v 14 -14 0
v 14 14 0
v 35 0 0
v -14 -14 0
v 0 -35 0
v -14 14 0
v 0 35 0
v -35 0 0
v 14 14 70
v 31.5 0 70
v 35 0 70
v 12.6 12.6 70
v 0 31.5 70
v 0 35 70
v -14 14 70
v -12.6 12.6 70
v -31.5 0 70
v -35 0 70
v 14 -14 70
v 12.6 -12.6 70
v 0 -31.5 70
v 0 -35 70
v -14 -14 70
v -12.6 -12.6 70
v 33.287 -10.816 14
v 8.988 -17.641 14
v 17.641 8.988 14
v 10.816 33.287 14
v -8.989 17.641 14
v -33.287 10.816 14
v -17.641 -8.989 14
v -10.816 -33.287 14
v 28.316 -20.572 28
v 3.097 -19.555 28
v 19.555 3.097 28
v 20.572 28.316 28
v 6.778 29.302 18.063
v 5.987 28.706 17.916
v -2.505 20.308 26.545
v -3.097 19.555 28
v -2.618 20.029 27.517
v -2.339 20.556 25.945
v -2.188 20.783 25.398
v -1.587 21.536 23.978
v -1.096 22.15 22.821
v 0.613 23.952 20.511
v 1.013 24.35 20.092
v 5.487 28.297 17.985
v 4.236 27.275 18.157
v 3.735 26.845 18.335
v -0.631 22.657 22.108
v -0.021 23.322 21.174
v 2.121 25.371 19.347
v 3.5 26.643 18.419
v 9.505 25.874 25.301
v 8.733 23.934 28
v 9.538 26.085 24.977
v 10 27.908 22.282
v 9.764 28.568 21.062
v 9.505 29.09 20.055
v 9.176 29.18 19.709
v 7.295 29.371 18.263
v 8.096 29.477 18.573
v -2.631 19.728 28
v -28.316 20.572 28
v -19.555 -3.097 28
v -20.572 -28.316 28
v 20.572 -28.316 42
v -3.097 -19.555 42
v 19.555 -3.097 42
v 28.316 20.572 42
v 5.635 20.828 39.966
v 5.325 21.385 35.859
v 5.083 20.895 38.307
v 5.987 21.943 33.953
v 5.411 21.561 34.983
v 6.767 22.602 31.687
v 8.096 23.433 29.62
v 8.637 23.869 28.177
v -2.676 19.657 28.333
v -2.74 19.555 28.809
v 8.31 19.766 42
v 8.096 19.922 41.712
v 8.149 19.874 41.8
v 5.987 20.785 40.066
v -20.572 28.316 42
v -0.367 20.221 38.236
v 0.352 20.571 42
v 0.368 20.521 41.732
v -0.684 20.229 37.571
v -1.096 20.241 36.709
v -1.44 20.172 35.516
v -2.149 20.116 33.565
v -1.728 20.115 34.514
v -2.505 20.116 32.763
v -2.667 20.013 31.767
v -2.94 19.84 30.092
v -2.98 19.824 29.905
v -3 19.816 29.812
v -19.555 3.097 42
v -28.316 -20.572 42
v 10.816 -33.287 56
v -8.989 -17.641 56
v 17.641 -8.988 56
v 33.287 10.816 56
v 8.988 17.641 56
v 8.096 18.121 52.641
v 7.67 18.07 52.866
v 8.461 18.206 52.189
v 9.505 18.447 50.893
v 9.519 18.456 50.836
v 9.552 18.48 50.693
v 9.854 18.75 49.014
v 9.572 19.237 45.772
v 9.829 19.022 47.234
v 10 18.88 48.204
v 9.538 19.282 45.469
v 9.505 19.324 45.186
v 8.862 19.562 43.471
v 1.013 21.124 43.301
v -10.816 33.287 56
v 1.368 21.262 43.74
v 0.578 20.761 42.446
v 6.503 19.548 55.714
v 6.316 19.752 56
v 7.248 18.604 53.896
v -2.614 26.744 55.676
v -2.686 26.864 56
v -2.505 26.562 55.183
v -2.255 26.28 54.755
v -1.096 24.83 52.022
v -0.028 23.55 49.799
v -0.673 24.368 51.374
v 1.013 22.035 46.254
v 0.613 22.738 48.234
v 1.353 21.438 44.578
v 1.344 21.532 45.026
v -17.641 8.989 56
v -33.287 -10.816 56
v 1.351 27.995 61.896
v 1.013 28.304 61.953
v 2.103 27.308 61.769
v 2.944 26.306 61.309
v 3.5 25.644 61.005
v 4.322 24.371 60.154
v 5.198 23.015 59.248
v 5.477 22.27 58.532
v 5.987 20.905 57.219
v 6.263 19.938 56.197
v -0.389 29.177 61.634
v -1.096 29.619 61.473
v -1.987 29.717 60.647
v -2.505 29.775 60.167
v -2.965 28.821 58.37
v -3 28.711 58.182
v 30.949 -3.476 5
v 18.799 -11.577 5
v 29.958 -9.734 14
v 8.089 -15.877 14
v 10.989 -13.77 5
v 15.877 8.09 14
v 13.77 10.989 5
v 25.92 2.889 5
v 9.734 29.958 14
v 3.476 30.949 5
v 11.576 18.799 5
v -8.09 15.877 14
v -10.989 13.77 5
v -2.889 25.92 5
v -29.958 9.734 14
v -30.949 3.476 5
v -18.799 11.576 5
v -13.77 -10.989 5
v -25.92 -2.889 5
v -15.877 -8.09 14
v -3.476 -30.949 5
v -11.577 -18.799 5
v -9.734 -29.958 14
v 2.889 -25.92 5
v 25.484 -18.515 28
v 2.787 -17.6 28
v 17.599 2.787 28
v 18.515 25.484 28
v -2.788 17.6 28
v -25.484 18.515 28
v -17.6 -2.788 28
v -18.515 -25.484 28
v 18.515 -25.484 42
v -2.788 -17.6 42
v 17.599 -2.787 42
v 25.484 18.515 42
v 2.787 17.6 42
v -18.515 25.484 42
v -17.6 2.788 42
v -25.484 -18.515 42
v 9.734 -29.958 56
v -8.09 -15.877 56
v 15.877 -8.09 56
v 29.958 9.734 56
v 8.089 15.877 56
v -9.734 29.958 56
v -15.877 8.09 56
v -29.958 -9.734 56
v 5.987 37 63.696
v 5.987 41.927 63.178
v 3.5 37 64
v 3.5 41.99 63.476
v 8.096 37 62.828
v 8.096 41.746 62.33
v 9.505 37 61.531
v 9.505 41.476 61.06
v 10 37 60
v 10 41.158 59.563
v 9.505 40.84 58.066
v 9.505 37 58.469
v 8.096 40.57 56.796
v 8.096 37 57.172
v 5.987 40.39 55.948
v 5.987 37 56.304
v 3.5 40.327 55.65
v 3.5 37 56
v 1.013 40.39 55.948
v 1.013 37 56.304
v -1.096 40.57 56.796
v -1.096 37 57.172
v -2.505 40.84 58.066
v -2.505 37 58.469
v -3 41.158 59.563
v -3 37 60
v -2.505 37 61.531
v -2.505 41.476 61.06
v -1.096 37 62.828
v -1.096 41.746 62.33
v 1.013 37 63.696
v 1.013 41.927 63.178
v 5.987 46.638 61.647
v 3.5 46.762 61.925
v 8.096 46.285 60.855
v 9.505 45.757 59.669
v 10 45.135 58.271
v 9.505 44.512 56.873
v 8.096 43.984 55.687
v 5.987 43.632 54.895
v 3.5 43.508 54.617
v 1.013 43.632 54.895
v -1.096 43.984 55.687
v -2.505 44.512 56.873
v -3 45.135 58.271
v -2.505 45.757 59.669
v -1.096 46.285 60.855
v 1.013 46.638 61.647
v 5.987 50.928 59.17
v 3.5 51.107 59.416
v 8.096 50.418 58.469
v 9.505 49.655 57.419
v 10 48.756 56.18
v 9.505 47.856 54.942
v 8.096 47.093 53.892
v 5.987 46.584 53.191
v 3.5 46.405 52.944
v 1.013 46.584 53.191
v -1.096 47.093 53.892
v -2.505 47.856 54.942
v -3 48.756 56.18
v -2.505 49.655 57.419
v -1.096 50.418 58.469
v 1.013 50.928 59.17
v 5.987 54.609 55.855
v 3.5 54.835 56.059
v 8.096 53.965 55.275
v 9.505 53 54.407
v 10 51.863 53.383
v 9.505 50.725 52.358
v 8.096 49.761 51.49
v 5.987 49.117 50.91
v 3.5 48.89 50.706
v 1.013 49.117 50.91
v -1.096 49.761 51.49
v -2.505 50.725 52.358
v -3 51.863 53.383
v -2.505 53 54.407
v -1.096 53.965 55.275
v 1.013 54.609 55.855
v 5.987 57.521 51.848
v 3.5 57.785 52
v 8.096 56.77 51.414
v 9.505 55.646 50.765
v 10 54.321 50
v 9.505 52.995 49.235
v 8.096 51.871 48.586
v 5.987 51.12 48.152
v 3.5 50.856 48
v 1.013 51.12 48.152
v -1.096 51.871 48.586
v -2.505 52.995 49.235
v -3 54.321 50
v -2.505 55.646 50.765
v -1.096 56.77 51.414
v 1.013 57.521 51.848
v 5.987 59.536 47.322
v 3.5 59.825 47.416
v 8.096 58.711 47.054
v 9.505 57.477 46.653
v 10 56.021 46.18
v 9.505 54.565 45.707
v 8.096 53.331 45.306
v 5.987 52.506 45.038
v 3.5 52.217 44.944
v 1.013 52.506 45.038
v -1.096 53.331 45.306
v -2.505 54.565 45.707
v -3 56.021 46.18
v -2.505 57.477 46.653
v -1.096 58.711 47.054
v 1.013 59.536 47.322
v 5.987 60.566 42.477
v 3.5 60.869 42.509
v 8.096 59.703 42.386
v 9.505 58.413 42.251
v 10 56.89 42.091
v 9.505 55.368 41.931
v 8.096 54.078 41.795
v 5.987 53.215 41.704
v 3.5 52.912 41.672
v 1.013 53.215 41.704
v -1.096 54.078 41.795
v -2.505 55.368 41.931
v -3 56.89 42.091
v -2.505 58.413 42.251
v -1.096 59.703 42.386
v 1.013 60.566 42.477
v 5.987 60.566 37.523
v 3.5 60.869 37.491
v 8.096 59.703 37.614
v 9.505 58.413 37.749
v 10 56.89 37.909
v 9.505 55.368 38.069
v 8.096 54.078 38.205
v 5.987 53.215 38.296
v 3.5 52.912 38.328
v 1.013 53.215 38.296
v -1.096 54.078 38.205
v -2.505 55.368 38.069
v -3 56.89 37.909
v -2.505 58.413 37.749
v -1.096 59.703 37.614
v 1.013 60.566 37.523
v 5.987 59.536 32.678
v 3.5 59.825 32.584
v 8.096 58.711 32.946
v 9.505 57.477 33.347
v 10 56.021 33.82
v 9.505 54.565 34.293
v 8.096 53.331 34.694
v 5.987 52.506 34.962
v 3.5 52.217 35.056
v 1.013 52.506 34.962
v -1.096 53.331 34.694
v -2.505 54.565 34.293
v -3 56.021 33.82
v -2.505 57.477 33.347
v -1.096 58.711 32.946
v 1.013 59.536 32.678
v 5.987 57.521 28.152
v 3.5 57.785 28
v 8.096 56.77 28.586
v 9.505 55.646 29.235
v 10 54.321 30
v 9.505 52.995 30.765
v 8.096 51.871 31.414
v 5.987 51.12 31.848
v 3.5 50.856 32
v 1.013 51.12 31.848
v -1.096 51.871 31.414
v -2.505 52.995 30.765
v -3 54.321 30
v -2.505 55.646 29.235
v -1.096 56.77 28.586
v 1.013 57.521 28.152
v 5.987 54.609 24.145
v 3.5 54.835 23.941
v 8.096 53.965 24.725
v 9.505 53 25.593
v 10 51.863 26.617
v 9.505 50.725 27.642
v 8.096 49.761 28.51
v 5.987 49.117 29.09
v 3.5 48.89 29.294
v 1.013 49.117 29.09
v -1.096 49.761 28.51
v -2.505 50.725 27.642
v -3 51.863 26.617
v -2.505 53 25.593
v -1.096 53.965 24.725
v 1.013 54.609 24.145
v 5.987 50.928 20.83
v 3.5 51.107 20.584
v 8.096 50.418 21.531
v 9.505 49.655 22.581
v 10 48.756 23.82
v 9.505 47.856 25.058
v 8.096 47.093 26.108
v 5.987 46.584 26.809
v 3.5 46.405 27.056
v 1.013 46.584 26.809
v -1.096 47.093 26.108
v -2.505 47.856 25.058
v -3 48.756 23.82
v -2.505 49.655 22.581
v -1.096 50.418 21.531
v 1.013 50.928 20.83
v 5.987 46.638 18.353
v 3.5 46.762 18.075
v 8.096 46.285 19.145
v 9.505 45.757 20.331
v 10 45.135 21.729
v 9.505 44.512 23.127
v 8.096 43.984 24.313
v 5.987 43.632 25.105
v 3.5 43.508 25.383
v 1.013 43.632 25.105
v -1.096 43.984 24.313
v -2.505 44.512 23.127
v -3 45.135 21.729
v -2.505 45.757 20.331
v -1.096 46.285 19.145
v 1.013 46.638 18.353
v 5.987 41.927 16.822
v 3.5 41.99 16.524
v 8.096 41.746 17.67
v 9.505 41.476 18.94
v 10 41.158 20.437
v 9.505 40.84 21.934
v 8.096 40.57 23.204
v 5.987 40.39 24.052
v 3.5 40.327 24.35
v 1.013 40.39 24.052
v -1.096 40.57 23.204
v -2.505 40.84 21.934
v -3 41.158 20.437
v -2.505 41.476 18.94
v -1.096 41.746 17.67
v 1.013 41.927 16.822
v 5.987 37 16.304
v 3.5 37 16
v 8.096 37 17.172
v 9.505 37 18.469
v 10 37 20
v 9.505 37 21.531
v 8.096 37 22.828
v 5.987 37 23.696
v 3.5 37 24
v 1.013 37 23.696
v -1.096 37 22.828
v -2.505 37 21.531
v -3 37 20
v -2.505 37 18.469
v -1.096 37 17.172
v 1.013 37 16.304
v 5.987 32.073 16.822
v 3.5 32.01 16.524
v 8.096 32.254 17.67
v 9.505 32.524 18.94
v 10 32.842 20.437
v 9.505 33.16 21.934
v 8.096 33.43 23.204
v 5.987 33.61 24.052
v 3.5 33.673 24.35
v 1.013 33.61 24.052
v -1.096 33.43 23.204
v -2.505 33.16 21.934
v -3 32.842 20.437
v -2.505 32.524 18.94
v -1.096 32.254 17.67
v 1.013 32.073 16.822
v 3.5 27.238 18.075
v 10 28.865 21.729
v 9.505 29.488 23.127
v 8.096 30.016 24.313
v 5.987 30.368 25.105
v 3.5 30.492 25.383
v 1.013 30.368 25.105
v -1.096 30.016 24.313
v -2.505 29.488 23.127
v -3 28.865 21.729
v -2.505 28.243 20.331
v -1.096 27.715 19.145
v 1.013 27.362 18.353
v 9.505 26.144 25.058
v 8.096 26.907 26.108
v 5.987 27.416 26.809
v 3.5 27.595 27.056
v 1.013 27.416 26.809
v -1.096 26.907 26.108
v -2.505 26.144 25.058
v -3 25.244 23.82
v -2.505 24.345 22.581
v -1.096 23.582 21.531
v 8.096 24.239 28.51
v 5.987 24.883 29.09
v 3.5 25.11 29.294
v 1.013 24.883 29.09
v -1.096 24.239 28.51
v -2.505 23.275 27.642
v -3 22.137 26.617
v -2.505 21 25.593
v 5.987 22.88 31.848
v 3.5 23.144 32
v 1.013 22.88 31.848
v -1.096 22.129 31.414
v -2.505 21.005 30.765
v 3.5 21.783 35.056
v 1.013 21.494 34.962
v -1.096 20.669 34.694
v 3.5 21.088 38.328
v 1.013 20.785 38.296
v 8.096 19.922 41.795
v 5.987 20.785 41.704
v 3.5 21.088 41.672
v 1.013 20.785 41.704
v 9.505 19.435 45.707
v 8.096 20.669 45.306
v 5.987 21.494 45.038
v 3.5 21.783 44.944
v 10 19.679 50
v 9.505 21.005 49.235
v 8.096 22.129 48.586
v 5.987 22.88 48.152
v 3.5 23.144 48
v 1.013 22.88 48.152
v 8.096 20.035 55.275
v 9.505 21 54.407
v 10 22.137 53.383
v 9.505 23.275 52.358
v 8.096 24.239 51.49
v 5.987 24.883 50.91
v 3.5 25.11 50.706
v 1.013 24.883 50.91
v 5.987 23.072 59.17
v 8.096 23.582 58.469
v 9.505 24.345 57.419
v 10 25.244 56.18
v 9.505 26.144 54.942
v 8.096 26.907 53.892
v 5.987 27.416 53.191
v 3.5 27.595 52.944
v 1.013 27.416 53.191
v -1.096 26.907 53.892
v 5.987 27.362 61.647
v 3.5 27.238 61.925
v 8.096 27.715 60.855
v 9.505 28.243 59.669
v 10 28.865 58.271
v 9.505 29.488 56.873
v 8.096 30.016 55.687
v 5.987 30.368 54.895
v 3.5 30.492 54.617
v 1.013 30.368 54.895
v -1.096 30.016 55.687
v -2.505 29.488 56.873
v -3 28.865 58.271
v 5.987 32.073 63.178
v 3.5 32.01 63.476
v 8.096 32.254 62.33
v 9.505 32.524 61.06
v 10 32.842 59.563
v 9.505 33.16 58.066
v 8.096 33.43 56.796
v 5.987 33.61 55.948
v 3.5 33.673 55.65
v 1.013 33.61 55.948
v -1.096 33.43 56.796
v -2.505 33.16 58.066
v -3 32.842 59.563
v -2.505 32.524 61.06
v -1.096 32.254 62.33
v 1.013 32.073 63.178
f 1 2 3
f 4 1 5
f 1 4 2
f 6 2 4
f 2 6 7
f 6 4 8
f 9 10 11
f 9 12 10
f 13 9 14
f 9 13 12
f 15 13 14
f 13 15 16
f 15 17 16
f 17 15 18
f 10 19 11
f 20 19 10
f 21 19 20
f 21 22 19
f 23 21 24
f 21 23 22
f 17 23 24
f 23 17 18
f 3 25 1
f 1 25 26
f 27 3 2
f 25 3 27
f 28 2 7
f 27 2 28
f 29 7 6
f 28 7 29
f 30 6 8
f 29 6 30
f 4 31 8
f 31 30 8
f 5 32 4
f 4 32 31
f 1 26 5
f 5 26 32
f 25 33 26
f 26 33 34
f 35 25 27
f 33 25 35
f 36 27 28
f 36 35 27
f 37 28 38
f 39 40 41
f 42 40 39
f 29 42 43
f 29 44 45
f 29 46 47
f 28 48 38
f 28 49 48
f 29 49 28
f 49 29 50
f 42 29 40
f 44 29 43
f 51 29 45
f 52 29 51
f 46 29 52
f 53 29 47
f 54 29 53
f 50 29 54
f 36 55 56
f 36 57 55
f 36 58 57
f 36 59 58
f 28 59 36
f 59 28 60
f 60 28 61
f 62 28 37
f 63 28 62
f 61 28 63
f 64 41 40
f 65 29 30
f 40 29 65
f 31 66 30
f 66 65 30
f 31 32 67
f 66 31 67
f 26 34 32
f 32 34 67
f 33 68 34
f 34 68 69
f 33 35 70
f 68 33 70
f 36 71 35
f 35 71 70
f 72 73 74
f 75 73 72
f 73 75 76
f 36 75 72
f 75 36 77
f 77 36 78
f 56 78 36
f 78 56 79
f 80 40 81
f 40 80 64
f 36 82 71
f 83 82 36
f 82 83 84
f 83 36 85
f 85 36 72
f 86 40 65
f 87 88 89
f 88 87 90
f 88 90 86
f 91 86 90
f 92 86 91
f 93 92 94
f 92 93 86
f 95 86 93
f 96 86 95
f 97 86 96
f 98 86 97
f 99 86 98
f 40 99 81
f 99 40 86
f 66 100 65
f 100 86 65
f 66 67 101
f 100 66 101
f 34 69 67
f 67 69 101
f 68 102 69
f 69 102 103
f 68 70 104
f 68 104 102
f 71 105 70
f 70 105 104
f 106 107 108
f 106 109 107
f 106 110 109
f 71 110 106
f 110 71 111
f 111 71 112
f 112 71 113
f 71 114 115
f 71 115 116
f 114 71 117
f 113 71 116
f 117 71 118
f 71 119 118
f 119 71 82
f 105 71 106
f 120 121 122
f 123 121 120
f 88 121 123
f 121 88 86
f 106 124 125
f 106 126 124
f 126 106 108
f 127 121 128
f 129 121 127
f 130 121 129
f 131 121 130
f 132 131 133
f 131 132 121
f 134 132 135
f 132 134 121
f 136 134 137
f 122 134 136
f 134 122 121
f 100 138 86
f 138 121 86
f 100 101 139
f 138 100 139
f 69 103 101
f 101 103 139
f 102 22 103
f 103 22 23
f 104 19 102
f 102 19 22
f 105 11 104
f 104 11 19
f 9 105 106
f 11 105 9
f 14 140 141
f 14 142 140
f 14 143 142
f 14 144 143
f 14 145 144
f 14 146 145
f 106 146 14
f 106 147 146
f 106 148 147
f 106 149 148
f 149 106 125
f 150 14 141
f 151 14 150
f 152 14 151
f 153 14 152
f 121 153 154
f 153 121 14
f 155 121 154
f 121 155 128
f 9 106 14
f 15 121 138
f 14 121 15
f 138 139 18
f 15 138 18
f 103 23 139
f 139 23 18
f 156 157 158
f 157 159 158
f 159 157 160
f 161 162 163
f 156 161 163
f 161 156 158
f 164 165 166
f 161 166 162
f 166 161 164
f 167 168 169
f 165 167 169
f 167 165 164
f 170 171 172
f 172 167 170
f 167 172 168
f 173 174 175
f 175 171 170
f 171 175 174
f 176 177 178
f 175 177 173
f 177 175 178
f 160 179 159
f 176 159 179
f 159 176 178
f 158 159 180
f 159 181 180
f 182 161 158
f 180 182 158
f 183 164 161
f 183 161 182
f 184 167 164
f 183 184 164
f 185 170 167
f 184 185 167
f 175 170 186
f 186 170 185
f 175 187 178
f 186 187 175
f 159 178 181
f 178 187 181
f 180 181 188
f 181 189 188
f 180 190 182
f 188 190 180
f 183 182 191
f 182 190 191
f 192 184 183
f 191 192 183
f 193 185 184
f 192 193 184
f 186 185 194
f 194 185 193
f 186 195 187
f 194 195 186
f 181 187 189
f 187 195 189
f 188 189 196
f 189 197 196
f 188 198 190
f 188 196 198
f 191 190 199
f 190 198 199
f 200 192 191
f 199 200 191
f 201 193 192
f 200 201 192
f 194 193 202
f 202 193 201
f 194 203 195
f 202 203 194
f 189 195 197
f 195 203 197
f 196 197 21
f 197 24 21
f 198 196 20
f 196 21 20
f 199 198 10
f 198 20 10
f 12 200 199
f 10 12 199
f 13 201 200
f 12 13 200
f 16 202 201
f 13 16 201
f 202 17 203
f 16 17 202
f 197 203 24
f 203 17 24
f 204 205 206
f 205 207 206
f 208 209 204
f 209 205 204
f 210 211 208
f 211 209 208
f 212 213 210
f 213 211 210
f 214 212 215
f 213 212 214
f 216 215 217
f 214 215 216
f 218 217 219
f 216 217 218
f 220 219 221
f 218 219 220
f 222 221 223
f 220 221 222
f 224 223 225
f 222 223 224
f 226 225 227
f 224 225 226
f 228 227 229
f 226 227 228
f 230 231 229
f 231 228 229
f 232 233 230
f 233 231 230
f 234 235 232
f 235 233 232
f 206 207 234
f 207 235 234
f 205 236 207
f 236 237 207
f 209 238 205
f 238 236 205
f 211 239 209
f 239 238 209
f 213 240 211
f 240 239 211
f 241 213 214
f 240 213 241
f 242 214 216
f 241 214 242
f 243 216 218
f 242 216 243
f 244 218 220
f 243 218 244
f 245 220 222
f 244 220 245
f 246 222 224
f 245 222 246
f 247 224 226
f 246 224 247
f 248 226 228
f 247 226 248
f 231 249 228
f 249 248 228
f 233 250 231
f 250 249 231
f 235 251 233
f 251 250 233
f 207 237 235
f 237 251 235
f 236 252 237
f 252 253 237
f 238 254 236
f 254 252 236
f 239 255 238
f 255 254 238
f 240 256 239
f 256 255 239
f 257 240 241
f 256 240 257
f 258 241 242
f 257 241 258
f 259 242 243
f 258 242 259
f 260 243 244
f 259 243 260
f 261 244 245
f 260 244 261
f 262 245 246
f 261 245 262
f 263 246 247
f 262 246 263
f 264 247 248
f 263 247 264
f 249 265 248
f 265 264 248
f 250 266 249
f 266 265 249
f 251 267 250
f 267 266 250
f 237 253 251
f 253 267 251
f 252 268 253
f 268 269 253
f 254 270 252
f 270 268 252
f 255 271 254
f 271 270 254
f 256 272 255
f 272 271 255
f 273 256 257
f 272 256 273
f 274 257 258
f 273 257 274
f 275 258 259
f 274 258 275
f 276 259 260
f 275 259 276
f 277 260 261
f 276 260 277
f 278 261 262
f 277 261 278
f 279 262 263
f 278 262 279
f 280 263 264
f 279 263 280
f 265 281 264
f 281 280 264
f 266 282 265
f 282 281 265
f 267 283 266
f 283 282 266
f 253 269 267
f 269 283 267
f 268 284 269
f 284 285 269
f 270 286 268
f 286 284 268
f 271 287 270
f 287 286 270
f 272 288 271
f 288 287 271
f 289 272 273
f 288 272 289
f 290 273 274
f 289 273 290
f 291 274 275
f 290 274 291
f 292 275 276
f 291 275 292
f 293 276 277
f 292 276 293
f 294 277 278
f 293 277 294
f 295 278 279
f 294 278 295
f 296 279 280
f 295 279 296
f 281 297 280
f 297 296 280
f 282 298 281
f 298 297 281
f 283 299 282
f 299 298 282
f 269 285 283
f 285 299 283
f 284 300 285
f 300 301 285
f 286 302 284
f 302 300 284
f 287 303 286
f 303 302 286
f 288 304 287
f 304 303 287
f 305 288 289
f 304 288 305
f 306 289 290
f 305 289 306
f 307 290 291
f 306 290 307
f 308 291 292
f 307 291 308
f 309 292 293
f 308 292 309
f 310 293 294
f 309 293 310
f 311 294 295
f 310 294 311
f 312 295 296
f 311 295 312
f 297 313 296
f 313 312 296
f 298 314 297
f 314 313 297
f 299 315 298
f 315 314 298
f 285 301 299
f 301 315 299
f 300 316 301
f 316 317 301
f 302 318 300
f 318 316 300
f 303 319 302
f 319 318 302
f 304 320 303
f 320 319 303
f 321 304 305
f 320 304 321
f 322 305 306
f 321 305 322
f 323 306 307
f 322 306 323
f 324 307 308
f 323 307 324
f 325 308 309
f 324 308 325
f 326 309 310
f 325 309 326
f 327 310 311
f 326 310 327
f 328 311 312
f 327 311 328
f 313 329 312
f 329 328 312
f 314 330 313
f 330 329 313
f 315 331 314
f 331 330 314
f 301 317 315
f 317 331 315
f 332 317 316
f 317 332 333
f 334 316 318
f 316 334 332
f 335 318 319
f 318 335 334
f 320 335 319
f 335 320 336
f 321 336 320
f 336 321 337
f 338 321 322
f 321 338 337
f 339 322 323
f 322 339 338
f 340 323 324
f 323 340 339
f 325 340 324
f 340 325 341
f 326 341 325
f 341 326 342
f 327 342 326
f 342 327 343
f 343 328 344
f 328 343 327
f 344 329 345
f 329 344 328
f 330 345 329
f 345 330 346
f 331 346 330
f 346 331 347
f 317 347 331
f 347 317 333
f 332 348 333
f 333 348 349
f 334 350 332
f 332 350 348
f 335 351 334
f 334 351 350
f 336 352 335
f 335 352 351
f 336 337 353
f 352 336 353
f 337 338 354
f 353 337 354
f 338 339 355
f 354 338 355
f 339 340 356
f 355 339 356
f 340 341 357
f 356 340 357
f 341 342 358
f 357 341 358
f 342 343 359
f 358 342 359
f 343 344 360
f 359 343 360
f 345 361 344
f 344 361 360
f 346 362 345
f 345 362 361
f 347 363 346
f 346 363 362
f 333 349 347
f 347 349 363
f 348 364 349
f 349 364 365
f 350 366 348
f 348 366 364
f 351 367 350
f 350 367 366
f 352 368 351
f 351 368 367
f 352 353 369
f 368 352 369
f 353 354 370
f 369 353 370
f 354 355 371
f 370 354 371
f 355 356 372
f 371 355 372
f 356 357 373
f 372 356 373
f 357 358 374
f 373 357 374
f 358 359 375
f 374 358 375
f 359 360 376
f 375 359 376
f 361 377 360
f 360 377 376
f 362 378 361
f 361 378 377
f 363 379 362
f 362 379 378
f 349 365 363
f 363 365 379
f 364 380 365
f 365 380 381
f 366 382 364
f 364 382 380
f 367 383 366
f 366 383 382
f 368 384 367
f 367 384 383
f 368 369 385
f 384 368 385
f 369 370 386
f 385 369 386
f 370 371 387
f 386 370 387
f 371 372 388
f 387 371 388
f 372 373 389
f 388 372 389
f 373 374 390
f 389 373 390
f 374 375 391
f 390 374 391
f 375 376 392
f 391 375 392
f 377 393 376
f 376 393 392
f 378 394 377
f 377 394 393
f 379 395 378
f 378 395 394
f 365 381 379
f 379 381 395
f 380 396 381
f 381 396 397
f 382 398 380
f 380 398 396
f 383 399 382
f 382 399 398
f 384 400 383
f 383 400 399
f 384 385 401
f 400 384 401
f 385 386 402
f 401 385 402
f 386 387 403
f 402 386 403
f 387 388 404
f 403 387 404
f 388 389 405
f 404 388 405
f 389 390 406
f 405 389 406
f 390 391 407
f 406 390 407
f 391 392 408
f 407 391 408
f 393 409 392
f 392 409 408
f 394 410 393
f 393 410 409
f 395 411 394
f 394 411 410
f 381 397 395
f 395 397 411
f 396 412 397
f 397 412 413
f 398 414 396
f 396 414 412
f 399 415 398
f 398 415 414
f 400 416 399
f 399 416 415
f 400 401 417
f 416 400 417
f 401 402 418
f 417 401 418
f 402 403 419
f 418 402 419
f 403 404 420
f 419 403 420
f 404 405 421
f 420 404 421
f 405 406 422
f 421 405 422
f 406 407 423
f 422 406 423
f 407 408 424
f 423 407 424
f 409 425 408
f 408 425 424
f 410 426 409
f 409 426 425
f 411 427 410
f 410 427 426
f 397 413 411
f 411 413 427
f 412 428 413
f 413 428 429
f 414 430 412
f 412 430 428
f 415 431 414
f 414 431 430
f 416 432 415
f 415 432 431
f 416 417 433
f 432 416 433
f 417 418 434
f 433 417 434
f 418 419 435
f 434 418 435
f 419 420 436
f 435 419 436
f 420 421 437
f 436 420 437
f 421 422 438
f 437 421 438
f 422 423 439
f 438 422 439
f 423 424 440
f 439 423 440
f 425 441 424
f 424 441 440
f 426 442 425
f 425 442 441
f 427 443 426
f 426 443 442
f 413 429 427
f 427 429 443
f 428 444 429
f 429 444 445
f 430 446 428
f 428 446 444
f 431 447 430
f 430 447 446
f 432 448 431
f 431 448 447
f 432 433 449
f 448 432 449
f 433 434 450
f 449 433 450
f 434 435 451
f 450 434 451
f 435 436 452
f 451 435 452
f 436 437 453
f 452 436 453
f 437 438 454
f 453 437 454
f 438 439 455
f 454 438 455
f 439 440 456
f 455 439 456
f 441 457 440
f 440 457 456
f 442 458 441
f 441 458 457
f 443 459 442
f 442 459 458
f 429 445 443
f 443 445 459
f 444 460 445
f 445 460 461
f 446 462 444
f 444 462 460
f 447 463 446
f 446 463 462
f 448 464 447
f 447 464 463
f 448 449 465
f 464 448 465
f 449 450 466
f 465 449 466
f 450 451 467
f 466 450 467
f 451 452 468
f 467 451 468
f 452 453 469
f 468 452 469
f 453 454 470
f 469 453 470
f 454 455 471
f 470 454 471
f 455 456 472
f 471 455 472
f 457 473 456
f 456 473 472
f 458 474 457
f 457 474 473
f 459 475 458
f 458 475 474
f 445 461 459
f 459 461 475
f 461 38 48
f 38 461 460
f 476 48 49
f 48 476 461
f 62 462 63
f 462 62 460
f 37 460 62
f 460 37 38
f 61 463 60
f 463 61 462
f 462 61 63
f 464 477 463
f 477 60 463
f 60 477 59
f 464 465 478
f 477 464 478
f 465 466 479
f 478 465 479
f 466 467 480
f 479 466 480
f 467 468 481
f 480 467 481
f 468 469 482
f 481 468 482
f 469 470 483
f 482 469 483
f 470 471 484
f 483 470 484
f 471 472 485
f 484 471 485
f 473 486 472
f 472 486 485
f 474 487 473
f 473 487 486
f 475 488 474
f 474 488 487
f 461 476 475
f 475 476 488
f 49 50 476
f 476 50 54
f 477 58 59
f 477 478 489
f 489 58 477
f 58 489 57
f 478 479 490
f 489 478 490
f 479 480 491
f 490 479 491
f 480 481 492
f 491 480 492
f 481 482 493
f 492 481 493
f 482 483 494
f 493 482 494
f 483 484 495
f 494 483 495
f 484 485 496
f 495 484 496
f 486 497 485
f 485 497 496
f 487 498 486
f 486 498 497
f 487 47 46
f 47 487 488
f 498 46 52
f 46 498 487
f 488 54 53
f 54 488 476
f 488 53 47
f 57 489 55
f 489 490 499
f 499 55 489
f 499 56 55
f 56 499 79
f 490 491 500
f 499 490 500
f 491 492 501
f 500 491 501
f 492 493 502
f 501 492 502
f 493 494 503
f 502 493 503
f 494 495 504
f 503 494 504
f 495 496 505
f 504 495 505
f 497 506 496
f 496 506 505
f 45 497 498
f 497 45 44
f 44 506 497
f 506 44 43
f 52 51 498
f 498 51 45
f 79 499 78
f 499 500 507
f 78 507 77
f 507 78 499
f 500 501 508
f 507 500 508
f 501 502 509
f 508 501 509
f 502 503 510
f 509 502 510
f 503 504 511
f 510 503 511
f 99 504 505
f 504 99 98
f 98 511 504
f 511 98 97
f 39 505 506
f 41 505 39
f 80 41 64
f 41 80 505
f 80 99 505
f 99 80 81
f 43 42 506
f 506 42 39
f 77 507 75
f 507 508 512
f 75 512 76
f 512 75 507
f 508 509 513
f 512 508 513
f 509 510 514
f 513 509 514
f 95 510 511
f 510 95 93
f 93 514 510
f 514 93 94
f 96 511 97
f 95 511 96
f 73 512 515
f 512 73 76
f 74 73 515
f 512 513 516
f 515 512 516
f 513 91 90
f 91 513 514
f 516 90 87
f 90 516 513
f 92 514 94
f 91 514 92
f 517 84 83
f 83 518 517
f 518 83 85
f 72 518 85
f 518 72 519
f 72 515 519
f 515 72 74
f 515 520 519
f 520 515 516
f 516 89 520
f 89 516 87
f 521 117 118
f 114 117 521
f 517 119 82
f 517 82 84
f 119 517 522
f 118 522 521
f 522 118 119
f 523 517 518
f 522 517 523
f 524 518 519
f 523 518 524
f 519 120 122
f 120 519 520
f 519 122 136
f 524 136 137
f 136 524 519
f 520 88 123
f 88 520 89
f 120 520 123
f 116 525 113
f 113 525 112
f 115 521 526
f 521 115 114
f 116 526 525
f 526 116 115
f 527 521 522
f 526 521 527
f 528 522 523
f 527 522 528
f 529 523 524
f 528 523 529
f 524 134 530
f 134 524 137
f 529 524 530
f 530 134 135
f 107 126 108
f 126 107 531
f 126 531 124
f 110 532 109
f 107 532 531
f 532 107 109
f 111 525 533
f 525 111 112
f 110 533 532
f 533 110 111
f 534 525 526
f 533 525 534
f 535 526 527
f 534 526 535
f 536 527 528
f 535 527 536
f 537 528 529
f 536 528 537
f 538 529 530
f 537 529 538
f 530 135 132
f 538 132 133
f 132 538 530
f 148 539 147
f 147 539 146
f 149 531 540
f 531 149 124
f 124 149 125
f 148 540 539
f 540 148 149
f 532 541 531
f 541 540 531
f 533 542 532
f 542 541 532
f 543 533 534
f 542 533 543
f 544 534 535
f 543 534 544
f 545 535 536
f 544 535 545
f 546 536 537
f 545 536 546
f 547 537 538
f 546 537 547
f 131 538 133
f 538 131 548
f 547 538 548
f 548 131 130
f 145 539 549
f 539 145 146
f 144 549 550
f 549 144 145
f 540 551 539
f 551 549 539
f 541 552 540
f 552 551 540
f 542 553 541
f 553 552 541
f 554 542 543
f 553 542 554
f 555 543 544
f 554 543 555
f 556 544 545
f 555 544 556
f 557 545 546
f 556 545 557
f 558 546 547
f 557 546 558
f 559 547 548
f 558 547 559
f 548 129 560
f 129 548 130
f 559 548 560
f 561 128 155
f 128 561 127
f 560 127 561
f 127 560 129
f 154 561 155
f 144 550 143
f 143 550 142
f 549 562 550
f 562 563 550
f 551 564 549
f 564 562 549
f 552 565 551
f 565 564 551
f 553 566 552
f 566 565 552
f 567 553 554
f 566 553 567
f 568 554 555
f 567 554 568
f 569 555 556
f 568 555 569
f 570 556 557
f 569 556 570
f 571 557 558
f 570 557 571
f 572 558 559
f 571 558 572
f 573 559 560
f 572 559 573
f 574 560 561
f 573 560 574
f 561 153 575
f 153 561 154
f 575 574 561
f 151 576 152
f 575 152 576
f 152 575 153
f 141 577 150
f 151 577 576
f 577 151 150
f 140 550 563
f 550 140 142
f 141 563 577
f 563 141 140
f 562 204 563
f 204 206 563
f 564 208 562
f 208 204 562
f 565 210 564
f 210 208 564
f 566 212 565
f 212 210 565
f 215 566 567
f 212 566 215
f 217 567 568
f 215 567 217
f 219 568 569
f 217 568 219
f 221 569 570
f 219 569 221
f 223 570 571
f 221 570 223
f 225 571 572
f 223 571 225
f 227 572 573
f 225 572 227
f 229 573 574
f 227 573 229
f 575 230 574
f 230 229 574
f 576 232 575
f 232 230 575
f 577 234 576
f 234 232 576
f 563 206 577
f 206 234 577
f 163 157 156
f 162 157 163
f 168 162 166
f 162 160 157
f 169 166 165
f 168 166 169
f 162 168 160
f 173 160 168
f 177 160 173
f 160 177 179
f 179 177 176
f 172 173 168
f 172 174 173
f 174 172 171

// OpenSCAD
module star(w,h,d)
{
    resize([w,h])
    translate([-1,-1])
        polygon([
                    [0+d,0+d],
                    [-0.5,1],
                    [0+d,2-d],
                    [1,2.5],
                    [2-d,2-d],
                    [2.5,1],
                    [2-d,0+d],
                    [1,-0.5]
                ]);
}

module solid()
{
        linear_extrude(70,twist=90,slices=5)
            star(70,70,0.4);
}

module bottom()
{
    difference()
    {
        solid();
        
        translate([-50,-50,5])
            cube([100,100,100]);
    }
}

module handle()
{
    rotate_extrude(angle=360)
        translate([20,0,0])
            scale([0.8,1.3])
                circle(5);
}

module cup()
{
    union()
    {
        difference()
        {
            solid();
            
            scale([0.9,0.9,1])
                solid();
        }

        difference()
        {
                
            translate([3.5,37,40])
                rotate([0,90,0])
                    handle();
            
            scale([0.9,0.9,1])
                solid();
        }
        
        bottom(); 
    }
}

color([0.5,0.5,0.5])
    cup();
